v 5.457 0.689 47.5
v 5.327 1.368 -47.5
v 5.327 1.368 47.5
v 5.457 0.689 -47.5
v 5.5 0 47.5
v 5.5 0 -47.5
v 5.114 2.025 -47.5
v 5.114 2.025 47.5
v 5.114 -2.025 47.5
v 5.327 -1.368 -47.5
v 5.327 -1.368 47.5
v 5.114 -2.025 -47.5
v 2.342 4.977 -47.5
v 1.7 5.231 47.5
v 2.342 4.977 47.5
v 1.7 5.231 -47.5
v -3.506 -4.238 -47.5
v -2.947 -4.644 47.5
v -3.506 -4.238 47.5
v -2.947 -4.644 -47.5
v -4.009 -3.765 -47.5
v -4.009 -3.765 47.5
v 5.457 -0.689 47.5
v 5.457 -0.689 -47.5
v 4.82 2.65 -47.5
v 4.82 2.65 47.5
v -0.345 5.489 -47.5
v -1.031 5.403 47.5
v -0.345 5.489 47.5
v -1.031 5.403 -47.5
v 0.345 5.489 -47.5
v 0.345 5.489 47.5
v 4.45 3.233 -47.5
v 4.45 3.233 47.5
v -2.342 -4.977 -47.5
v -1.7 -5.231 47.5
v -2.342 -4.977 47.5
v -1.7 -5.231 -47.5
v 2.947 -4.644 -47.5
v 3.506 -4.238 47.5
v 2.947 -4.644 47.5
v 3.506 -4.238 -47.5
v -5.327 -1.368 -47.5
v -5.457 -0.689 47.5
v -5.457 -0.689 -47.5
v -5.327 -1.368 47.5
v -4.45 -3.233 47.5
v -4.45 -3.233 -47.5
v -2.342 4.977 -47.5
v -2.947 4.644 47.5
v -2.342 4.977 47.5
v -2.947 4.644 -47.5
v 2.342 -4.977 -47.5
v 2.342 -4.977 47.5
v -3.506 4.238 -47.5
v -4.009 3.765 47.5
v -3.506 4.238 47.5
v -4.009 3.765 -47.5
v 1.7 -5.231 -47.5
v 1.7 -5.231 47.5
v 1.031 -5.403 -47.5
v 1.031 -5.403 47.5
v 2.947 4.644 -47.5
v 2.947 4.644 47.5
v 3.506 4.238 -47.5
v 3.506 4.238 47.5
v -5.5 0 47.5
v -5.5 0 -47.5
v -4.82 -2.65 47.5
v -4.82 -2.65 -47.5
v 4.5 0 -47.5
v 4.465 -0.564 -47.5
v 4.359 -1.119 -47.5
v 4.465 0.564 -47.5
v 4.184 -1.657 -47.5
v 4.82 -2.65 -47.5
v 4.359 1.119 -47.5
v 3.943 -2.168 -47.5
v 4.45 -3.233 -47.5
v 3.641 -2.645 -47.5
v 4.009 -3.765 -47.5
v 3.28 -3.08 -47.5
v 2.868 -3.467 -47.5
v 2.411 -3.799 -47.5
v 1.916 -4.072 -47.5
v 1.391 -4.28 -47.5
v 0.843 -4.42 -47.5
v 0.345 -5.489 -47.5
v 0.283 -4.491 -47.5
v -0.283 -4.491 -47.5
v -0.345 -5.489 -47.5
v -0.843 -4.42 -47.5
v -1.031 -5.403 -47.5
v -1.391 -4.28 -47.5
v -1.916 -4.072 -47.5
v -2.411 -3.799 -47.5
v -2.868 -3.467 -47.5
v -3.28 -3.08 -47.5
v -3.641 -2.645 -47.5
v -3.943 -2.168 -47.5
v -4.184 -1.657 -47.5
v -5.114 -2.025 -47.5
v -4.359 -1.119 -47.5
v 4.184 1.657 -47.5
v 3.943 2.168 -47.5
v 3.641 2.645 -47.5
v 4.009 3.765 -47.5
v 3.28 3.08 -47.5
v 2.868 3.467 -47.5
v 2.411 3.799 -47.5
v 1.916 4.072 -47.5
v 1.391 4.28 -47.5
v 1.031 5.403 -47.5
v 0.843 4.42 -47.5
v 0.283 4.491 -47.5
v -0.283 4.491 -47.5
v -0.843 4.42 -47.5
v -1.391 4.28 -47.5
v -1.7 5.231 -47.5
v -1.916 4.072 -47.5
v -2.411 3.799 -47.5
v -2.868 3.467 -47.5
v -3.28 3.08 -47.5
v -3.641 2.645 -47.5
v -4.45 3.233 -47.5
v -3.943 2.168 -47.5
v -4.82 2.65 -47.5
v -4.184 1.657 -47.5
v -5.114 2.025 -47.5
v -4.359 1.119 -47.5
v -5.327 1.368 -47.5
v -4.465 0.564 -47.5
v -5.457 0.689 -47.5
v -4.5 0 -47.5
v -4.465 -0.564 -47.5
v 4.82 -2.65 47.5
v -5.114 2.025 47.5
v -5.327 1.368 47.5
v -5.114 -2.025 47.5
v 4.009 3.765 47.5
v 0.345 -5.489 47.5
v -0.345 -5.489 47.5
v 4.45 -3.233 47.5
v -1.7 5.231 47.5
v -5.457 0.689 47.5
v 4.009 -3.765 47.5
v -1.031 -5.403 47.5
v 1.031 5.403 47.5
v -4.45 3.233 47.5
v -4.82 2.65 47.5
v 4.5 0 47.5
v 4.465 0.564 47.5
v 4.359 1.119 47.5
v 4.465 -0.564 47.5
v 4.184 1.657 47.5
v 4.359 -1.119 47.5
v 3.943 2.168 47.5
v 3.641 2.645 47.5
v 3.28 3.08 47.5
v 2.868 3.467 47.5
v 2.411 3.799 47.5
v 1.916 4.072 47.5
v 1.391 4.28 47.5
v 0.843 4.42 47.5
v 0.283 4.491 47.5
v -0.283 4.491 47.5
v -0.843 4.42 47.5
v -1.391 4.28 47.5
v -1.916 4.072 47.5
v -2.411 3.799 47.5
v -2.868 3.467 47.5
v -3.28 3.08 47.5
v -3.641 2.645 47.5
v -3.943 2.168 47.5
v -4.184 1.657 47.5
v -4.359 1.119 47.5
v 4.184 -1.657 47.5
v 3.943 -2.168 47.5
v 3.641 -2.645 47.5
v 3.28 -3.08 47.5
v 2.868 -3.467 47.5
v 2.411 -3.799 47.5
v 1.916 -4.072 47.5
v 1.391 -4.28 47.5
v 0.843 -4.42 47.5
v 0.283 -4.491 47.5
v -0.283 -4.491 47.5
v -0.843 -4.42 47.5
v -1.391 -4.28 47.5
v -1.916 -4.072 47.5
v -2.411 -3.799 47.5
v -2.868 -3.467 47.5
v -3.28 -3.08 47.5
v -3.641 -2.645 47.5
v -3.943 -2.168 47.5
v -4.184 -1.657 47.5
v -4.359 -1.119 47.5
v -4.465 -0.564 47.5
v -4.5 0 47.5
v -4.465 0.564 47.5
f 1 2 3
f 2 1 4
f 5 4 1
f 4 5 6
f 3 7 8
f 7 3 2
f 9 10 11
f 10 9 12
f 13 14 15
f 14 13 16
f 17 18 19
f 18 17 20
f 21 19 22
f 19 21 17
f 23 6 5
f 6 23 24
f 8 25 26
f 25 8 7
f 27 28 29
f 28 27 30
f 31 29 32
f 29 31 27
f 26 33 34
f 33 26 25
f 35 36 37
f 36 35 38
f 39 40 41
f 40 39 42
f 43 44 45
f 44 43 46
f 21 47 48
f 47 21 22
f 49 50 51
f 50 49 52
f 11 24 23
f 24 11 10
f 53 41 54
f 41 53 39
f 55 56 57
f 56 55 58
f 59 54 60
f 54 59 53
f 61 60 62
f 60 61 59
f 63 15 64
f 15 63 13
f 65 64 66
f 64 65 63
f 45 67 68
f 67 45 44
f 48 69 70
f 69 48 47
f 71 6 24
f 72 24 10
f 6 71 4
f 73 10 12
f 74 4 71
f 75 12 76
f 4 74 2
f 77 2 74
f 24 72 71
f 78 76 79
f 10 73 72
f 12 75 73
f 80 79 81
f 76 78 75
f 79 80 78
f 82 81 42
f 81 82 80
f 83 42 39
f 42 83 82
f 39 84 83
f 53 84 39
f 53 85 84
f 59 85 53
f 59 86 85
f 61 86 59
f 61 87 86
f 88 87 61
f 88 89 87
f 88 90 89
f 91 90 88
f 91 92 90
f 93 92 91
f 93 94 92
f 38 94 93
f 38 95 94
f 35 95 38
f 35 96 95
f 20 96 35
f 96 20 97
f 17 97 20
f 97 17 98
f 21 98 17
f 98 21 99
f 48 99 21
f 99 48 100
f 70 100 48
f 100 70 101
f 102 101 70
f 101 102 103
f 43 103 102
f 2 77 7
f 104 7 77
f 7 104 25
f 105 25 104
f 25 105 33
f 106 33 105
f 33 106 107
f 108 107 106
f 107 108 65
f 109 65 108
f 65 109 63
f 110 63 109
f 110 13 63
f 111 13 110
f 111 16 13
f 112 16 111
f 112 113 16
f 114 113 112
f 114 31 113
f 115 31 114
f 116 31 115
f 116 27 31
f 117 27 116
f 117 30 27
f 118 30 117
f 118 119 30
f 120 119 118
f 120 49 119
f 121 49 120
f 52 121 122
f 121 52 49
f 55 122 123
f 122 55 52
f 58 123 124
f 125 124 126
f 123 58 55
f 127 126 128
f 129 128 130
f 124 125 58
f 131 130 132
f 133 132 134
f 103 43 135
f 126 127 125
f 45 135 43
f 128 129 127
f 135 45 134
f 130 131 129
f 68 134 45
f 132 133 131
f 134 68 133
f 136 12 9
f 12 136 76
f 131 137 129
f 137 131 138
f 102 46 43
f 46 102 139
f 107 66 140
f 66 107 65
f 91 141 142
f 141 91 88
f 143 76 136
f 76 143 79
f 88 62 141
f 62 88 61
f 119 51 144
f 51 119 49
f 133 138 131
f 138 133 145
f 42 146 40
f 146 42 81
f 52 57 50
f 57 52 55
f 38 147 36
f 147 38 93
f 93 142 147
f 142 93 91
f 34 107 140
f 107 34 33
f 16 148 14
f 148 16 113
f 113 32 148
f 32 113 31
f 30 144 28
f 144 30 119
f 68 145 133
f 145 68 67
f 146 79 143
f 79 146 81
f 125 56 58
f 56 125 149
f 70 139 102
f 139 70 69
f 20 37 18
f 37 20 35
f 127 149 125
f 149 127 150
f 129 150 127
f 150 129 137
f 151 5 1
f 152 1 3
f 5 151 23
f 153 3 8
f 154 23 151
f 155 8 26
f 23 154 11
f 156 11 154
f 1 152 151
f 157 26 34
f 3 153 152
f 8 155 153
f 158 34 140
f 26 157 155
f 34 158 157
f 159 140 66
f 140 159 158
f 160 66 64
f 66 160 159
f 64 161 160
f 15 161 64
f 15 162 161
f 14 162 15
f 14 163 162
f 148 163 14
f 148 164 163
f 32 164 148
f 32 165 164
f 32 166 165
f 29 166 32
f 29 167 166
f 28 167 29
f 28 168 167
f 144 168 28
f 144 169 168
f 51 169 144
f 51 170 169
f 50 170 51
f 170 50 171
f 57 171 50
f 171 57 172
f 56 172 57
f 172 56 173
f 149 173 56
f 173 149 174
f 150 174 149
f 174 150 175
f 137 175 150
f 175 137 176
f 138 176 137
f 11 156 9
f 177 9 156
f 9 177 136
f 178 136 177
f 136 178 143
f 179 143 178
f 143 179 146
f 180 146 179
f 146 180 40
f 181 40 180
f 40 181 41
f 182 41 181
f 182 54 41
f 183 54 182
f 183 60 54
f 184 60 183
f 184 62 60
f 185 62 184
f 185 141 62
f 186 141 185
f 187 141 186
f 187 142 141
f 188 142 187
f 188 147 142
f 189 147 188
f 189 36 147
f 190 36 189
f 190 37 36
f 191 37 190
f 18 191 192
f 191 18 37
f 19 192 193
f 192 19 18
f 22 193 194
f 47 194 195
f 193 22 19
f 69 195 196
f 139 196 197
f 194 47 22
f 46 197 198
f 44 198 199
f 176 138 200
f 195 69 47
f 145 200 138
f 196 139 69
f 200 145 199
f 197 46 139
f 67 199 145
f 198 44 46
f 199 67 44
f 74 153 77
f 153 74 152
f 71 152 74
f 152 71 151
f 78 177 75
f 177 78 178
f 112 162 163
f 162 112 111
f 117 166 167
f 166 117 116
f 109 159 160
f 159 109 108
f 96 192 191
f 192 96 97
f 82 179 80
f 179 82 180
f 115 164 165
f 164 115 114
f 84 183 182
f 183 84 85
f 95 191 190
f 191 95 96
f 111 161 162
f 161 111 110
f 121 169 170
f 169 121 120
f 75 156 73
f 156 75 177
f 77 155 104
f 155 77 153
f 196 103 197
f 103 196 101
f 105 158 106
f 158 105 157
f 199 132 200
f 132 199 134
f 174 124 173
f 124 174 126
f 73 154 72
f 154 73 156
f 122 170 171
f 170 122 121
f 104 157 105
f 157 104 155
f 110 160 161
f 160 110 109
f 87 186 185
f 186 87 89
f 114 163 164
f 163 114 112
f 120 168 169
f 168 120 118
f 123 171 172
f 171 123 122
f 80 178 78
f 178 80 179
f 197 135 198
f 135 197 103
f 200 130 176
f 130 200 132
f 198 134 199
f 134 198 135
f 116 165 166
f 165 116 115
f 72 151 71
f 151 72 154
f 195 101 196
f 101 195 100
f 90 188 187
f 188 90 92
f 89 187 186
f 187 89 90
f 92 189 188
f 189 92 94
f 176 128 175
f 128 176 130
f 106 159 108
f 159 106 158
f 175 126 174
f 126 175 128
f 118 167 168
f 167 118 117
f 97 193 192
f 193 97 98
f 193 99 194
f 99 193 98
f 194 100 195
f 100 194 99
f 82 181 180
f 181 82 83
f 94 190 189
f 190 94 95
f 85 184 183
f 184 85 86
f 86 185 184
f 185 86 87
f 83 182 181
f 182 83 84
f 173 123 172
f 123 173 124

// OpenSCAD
$fn = 50;


difference() {
	union() {
		translate(v = [0, 0, -47.5000000000]) {
			cylinder(h = 95, r = 5.5000000000);
		}
	}
	union() {
		translate(v = [0, 0, -100.0000000000]) {
			cylinder(h = 200, r = 4.5000000000);
		}
	}
}
